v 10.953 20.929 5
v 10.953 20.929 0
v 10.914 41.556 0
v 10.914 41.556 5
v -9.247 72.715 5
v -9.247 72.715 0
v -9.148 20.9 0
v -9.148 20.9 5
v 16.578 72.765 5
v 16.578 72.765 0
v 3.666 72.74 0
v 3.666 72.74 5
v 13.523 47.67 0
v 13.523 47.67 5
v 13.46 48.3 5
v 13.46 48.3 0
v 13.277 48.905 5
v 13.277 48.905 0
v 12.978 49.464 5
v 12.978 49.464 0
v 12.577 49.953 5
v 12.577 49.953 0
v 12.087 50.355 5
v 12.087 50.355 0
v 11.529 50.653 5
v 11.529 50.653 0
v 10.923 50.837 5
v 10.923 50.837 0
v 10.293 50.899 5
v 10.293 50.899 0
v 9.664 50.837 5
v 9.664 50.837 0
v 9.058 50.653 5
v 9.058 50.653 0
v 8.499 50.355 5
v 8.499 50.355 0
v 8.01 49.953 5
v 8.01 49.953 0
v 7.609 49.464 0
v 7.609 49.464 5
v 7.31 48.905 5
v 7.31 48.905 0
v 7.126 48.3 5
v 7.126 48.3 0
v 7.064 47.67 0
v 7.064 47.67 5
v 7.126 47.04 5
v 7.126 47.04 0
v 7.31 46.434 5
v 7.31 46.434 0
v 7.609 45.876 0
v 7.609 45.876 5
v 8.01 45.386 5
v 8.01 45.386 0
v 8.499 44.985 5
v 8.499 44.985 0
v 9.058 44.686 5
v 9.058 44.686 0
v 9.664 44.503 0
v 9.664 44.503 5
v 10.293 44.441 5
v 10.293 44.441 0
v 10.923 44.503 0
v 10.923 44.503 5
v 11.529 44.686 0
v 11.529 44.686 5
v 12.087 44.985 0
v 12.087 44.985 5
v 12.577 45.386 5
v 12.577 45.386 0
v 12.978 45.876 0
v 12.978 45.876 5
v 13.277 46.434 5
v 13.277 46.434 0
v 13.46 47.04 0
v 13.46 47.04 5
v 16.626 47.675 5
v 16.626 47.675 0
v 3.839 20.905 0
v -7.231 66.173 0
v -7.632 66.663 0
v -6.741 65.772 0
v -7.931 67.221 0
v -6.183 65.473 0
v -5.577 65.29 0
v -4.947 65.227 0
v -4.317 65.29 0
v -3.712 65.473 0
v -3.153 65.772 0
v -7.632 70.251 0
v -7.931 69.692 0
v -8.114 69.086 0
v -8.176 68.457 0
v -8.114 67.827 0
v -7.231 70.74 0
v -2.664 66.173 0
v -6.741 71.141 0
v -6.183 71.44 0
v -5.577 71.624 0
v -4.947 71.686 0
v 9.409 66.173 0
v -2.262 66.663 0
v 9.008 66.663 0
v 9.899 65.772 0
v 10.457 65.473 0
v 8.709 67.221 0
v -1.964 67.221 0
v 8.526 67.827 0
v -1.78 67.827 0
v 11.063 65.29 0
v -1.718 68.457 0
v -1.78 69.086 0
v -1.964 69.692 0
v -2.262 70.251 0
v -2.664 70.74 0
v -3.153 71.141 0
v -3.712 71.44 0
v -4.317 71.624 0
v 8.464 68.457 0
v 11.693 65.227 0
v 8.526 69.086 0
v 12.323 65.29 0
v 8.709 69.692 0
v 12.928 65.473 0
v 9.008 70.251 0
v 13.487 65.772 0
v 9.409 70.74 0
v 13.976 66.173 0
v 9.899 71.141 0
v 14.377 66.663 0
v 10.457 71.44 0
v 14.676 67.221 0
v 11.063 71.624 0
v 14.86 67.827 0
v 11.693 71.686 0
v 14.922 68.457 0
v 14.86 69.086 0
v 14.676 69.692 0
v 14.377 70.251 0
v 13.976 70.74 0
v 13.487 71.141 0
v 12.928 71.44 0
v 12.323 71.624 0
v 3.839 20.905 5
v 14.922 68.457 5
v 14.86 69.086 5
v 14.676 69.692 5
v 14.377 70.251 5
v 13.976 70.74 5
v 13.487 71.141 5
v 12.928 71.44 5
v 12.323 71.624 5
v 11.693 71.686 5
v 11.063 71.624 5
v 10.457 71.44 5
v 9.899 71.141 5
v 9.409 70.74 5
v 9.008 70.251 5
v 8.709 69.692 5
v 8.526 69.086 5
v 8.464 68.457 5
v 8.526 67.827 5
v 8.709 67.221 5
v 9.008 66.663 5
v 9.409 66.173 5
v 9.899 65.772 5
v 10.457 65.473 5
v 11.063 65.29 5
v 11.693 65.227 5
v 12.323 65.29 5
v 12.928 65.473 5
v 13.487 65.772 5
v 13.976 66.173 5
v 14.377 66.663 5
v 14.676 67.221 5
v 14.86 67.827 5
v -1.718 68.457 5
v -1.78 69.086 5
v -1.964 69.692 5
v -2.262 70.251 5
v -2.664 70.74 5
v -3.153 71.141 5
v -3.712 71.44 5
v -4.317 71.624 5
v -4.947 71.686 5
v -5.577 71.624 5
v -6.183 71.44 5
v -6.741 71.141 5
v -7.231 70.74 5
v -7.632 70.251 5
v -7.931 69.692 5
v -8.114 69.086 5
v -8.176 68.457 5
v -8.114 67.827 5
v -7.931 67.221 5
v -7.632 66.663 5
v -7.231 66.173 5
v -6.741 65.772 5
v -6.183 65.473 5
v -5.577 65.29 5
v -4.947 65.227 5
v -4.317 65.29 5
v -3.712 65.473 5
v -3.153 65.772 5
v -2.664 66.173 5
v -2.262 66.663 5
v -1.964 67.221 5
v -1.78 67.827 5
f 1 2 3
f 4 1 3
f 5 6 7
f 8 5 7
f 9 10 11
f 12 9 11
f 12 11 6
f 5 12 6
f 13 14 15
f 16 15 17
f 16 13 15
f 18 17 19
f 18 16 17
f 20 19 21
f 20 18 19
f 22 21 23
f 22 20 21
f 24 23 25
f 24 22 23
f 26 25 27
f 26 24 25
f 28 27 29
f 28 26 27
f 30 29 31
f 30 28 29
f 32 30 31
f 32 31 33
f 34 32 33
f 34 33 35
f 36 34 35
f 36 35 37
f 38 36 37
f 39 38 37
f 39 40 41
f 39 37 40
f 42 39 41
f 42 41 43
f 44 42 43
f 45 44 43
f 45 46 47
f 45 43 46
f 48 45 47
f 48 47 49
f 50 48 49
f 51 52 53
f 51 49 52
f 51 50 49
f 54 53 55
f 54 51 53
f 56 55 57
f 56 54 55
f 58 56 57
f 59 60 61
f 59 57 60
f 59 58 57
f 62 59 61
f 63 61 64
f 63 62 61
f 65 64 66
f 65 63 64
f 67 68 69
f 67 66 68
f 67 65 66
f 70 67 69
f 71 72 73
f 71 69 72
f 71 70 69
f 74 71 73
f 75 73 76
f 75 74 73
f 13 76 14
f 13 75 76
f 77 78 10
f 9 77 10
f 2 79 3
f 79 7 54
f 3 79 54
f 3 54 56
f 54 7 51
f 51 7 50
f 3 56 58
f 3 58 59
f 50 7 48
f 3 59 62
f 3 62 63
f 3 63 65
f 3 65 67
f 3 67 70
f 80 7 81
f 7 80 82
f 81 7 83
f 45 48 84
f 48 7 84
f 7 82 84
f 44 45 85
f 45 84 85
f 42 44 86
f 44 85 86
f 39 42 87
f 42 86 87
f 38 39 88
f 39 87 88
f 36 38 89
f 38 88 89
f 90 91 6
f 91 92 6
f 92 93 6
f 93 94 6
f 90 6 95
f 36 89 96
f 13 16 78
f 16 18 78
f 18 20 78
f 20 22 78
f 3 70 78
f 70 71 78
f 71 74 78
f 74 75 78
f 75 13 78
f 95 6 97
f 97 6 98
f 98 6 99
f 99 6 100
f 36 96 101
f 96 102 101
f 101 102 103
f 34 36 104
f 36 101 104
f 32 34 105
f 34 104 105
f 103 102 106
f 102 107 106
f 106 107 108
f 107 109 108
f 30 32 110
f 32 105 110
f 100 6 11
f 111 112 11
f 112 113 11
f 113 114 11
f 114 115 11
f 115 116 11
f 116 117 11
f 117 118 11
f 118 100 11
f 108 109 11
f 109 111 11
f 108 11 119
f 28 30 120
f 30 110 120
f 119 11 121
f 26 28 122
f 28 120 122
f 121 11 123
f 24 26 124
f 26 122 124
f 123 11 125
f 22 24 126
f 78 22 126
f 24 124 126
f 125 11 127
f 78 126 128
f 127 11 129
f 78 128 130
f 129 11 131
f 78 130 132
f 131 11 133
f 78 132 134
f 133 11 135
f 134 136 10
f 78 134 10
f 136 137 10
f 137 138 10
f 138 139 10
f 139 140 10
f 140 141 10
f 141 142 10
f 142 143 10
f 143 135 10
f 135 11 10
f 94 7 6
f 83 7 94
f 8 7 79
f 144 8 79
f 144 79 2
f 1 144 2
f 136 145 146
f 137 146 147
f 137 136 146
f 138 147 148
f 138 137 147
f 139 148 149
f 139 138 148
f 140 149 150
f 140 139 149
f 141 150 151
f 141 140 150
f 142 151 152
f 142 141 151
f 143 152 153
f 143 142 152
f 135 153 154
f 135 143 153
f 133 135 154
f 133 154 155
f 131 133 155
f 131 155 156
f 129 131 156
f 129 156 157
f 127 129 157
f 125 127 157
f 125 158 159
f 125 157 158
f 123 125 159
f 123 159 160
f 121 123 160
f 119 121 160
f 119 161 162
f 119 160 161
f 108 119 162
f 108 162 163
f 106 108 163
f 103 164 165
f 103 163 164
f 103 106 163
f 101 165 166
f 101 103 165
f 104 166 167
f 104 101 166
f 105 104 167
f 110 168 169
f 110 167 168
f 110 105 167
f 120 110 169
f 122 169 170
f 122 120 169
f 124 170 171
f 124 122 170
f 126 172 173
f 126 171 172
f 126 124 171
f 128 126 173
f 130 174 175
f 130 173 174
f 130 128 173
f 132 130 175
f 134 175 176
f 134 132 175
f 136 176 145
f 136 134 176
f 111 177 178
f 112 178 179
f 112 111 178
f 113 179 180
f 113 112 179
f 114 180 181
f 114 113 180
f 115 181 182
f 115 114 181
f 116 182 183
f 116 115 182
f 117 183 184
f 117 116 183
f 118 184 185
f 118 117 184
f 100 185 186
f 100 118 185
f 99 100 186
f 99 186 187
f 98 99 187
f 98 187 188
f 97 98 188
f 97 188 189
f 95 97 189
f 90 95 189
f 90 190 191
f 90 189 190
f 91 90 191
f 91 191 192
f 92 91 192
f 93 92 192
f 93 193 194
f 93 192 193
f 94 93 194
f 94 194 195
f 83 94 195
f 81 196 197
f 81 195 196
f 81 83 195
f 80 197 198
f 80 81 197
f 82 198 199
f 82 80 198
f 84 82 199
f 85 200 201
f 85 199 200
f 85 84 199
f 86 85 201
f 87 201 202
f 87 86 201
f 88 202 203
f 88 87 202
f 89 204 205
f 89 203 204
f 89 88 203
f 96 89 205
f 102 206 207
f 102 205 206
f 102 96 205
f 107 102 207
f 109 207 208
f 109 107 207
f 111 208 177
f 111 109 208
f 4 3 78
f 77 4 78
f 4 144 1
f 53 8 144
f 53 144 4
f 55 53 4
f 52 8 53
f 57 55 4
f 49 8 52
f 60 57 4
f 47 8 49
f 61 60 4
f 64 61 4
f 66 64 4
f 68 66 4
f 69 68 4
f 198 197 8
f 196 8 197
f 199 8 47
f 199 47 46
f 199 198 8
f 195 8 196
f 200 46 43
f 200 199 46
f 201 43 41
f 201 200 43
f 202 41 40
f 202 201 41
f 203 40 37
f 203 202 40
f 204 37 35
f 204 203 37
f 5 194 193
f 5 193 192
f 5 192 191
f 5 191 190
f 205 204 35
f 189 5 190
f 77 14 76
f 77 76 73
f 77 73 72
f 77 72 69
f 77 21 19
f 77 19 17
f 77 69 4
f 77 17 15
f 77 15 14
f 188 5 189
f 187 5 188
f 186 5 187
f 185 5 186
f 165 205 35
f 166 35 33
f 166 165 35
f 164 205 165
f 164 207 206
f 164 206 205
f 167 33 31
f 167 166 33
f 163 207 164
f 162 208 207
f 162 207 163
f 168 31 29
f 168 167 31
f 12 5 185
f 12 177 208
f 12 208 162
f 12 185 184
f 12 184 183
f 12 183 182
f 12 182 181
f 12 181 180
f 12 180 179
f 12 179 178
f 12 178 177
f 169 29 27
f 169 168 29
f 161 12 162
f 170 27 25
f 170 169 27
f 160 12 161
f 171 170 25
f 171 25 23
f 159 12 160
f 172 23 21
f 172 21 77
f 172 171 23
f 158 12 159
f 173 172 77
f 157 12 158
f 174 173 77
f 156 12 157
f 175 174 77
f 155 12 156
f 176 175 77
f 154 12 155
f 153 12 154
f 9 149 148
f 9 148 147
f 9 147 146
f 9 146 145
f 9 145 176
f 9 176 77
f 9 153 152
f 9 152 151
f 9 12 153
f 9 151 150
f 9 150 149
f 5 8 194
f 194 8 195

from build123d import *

# Parameters (mm, degrees)
F1_DEPTH = 5
F2_DEPTH = 4
F3_DEPTH = 4
F4_R     = 3.22905
F4_R_2   = 3.229051
F5_DEPTH = 25


with BuildPart() as f1:
    # F0 (on Top) → F1 (new body)
    with BuildSketch(Plane.XY):
        Polygon((16.577804, 72.764611), (3.665576, 72.739941), (-9.246652, 72.715272), (-9.147654, 20.899711), (3.838721, 20.904658), (10.953161, 20.92936), (10.913751, 41.556355), (16.625739, 47.675223), align=None)
    extrude(amount=F1_DEPTH)

    # F0 (on Top) → F2 (join)
    with BuildSketch(Plane.XY):
        Polygon((16.577804, 72.764611), (3.665576, 72.739941), (-9.246652, 72.715272), (-9.147654, 20.899711), (3.838721, 20.904658), (10.953161, 20.92936), (10.913751, 41.556355), (16.625739, 47.675223), align=None)
    extrude(amount=F2_DEPTH)

    # F0 (on Top) → F3 (join)
    with BuildSketch(Plane.XY):
        Polygon((16.577804, 72.764611), (3.665576, 72.739941), (-9.246652, 72.715272), (-9.147654, 20.899711), (3.838721, 20.904658), (10.953161, 20.92936), (10.913751, 41.556355), (16.625739, 47.675223), align=None)
    extrude(amount=F3_DEPTH)

    # F4 (on Top) → F5 (cut)
    with BuildSketch(Plane.XY):
        with Locations((10.293464, 47.669735)):
            Circle(F4_R)
        with Locations((11.692577, 68.456538)):
            Circle(F4_R_2)
        with Locations((-4.947346, 68.456538)):
            Circle(F4_R_2)
    extrude(amount=F5_DEPTH, mode=Mode.SUBTRACT)


solid = f1.part
